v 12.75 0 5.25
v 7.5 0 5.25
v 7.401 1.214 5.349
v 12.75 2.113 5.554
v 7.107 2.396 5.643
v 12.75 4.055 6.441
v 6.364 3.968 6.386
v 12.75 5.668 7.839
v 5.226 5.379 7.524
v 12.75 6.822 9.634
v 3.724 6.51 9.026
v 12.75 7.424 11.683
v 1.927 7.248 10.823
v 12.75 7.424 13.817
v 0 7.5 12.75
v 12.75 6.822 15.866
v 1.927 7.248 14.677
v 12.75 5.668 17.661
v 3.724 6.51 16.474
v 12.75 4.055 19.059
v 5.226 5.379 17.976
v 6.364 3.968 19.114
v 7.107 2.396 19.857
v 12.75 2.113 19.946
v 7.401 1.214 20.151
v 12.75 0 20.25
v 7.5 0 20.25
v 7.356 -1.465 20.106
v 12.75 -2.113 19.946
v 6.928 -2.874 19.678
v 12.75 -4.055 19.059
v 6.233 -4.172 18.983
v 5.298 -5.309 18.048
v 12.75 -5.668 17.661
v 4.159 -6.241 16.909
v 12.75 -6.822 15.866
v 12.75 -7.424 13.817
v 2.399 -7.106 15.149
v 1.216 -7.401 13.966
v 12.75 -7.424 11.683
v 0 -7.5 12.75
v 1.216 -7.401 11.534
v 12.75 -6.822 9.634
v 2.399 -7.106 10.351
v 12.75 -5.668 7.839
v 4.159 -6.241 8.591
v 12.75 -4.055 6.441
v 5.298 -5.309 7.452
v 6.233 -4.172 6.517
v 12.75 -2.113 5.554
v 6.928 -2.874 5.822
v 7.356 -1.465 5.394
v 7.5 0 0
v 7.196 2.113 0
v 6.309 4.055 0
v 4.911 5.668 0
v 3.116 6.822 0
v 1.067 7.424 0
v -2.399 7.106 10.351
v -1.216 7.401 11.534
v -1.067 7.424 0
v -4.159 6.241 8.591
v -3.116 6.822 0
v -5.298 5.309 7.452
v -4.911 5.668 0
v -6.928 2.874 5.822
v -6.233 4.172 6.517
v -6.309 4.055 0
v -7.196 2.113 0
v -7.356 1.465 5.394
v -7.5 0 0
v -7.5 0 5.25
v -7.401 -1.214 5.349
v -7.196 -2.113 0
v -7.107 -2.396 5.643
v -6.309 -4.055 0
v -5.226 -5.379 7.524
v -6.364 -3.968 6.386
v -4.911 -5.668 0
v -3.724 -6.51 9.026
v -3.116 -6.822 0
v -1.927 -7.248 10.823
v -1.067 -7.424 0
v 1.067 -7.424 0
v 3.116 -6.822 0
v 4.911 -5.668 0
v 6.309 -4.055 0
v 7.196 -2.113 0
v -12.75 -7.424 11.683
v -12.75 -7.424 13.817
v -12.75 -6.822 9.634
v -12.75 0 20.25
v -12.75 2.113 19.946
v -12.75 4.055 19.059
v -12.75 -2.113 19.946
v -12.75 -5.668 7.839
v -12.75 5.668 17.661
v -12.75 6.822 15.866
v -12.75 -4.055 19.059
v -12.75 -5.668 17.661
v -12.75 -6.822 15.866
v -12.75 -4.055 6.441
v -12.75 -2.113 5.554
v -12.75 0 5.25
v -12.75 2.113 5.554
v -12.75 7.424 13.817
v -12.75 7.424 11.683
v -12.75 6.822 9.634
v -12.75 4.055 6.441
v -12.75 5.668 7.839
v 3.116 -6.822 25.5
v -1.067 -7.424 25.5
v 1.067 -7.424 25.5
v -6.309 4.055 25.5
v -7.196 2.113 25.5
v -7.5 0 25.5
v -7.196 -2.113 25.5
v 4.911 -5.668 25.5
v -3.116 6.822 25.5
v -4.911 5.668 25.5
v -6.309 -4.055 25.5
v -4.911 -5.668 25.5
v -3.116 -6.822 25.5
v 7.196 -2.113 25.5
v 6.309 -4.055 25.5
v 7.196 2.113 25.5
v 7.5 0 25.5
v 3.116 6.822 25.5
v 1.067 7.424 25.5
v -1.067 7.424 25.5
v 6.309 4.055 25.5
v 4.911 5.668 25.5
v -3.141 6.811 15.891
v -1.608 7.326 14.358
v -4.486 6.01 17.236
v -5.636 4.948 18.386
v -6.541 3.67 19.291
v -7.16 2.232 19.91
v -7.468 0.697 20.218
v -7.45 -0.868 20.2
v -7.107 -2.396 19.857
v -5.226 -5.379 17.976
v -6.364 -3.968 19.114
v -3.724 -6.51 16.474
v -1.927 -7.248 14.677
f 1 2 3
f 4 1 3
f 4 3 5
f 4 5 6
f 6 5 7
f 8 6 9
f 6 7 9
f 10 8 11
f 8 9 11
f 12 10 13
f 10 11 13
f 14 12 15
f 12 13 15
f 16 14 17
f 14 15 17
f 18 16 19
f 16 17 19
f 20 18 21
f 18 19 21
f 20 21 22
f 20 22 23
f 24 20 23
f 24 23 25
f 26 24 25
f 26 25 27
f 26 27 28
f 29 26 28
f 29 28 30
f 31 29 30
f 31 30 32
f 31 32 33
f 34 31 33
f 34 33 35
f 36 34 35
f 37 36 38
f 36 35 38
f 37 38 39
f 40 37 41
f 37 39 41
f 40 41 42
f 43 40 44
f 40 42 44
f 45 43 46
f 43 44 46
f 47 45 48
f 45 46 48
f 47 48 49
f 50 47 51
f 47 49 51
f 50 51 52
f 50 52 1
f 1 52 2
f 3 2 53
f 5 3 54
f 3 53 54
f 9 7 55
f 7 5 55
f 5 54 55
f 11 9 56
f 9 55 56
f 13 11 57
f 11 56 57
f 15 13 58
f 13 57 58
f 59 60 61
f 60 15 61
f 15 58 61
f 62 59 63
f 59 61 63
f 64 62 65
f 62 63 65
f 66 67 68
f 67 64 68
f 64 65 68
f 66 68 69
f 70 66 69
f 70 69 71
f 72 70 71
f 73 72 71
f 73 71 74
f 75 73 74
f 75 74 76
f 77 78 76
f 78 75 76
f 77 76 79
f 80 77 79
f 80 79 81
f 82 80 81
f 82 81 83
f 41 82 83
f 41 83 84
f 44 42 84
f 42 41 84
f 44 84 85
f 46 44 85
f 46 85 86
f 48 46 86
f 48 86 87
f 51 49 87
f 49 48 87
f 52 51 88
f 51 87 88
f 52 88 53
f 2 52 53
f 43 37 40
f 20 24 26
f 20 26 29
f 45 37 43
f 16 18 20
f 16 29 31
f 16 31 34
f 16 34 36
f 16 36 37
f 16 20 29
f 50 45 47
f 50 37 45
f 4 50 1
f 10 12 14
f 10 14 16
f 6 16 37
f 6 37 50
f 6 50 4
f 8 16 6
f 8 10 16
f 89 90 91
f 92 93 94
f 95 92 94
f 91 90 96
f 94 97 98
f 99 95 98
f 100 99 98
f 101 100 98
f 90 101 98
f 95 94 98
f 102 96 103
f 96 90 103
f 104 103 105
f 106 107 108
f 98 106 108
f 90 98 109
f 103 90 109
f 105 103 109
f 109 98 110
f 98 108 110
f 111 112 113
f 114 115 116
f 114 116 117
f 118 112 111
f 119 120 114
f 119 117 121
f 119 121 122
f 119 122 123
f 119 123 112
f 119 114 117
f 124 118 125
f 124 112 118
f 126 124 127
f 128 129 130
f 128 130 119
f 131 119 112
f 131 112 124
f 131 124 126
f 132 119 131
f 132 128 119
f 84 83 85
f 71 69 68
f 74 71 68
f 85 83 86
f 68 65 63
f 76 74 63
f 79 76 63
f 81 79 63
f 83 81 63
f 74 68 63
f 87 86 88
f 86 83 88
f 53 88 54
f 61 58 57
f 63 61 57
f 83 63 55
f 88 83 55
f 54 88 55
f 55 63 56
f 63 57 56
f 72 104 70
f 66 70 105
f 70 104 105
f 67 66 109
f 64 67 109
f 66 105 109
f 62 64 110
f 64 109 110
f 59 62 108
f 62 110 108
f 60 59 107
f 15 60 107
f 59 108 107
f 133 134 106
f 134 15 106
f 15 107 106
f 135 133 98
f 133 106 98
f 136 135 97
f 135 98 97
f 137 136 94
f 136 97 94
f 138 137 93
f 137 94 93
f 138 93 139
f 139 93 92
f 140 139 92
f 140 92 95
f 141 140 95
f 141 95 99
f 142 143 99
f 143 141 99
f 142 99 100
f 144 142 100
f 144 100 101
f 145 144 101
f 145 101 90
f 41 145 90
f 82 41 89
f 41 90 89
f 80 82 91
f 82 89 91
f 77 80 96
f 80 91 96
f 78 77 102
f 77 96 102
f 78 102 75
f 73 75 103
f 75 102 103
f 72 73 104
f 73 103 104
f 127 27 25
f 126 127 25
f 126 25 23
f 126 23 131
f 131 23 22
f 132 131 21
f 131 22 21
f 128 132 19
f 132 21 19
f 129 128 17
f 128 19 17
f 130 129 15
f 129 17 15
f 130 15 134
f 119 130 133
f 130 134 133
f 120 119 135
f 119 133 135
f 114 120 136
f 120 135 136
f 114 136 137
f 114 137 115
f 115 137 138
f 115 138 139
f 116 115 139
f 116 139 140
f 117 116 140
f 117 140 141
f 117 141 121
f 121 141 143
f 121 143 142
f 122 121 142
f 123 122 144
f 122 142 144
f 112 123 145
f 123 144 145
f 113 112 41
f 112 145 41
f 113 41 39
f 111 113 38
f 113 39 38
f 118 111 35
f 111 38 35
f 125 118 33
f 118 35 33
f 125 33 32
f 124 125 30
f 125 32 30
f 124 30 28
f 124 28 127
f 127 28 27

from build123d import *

# Parameters (mm, degrees)
SKETCH1_R                = 7.5
BOSS_EXTRUDE1_DEPTH      = 25.5
BOSS_EXTRUDE2_DEPTH      = 12.75
BOSS_EXTRUDE2_DEPTH_BACK = 12.75
SKETCH2_R                = 7.5


with BuildPart() as part:
    # Sketch1 → Boss-Extrude1 (new body)
    with BuildSketch(Plane.XY):
        Circle(SKETCH1_R)
    extrude(amount=BOSS_EXTRUDE1_DEPTH)

    # Sketch2 → Boss-Extrude2 (add, two sides: drawn at the far end of the back side and taken through both)
    with BuildSketch(Plane(origin=(0, 0, 0), x_dir=(0, 0, -1), z_dir=(1, 0, 0)).offset(-BOSS_EXTRUDE2_DEPTH_BACK)):
        with Locations((-12.75, 0)):
            Circle(SKETCH2_R)
    extrude(amount=BOSS_EXTRUDE2_DEPTH + BOSS_EXTRUDE2_DEPTH_BACK)


solid = part.part
